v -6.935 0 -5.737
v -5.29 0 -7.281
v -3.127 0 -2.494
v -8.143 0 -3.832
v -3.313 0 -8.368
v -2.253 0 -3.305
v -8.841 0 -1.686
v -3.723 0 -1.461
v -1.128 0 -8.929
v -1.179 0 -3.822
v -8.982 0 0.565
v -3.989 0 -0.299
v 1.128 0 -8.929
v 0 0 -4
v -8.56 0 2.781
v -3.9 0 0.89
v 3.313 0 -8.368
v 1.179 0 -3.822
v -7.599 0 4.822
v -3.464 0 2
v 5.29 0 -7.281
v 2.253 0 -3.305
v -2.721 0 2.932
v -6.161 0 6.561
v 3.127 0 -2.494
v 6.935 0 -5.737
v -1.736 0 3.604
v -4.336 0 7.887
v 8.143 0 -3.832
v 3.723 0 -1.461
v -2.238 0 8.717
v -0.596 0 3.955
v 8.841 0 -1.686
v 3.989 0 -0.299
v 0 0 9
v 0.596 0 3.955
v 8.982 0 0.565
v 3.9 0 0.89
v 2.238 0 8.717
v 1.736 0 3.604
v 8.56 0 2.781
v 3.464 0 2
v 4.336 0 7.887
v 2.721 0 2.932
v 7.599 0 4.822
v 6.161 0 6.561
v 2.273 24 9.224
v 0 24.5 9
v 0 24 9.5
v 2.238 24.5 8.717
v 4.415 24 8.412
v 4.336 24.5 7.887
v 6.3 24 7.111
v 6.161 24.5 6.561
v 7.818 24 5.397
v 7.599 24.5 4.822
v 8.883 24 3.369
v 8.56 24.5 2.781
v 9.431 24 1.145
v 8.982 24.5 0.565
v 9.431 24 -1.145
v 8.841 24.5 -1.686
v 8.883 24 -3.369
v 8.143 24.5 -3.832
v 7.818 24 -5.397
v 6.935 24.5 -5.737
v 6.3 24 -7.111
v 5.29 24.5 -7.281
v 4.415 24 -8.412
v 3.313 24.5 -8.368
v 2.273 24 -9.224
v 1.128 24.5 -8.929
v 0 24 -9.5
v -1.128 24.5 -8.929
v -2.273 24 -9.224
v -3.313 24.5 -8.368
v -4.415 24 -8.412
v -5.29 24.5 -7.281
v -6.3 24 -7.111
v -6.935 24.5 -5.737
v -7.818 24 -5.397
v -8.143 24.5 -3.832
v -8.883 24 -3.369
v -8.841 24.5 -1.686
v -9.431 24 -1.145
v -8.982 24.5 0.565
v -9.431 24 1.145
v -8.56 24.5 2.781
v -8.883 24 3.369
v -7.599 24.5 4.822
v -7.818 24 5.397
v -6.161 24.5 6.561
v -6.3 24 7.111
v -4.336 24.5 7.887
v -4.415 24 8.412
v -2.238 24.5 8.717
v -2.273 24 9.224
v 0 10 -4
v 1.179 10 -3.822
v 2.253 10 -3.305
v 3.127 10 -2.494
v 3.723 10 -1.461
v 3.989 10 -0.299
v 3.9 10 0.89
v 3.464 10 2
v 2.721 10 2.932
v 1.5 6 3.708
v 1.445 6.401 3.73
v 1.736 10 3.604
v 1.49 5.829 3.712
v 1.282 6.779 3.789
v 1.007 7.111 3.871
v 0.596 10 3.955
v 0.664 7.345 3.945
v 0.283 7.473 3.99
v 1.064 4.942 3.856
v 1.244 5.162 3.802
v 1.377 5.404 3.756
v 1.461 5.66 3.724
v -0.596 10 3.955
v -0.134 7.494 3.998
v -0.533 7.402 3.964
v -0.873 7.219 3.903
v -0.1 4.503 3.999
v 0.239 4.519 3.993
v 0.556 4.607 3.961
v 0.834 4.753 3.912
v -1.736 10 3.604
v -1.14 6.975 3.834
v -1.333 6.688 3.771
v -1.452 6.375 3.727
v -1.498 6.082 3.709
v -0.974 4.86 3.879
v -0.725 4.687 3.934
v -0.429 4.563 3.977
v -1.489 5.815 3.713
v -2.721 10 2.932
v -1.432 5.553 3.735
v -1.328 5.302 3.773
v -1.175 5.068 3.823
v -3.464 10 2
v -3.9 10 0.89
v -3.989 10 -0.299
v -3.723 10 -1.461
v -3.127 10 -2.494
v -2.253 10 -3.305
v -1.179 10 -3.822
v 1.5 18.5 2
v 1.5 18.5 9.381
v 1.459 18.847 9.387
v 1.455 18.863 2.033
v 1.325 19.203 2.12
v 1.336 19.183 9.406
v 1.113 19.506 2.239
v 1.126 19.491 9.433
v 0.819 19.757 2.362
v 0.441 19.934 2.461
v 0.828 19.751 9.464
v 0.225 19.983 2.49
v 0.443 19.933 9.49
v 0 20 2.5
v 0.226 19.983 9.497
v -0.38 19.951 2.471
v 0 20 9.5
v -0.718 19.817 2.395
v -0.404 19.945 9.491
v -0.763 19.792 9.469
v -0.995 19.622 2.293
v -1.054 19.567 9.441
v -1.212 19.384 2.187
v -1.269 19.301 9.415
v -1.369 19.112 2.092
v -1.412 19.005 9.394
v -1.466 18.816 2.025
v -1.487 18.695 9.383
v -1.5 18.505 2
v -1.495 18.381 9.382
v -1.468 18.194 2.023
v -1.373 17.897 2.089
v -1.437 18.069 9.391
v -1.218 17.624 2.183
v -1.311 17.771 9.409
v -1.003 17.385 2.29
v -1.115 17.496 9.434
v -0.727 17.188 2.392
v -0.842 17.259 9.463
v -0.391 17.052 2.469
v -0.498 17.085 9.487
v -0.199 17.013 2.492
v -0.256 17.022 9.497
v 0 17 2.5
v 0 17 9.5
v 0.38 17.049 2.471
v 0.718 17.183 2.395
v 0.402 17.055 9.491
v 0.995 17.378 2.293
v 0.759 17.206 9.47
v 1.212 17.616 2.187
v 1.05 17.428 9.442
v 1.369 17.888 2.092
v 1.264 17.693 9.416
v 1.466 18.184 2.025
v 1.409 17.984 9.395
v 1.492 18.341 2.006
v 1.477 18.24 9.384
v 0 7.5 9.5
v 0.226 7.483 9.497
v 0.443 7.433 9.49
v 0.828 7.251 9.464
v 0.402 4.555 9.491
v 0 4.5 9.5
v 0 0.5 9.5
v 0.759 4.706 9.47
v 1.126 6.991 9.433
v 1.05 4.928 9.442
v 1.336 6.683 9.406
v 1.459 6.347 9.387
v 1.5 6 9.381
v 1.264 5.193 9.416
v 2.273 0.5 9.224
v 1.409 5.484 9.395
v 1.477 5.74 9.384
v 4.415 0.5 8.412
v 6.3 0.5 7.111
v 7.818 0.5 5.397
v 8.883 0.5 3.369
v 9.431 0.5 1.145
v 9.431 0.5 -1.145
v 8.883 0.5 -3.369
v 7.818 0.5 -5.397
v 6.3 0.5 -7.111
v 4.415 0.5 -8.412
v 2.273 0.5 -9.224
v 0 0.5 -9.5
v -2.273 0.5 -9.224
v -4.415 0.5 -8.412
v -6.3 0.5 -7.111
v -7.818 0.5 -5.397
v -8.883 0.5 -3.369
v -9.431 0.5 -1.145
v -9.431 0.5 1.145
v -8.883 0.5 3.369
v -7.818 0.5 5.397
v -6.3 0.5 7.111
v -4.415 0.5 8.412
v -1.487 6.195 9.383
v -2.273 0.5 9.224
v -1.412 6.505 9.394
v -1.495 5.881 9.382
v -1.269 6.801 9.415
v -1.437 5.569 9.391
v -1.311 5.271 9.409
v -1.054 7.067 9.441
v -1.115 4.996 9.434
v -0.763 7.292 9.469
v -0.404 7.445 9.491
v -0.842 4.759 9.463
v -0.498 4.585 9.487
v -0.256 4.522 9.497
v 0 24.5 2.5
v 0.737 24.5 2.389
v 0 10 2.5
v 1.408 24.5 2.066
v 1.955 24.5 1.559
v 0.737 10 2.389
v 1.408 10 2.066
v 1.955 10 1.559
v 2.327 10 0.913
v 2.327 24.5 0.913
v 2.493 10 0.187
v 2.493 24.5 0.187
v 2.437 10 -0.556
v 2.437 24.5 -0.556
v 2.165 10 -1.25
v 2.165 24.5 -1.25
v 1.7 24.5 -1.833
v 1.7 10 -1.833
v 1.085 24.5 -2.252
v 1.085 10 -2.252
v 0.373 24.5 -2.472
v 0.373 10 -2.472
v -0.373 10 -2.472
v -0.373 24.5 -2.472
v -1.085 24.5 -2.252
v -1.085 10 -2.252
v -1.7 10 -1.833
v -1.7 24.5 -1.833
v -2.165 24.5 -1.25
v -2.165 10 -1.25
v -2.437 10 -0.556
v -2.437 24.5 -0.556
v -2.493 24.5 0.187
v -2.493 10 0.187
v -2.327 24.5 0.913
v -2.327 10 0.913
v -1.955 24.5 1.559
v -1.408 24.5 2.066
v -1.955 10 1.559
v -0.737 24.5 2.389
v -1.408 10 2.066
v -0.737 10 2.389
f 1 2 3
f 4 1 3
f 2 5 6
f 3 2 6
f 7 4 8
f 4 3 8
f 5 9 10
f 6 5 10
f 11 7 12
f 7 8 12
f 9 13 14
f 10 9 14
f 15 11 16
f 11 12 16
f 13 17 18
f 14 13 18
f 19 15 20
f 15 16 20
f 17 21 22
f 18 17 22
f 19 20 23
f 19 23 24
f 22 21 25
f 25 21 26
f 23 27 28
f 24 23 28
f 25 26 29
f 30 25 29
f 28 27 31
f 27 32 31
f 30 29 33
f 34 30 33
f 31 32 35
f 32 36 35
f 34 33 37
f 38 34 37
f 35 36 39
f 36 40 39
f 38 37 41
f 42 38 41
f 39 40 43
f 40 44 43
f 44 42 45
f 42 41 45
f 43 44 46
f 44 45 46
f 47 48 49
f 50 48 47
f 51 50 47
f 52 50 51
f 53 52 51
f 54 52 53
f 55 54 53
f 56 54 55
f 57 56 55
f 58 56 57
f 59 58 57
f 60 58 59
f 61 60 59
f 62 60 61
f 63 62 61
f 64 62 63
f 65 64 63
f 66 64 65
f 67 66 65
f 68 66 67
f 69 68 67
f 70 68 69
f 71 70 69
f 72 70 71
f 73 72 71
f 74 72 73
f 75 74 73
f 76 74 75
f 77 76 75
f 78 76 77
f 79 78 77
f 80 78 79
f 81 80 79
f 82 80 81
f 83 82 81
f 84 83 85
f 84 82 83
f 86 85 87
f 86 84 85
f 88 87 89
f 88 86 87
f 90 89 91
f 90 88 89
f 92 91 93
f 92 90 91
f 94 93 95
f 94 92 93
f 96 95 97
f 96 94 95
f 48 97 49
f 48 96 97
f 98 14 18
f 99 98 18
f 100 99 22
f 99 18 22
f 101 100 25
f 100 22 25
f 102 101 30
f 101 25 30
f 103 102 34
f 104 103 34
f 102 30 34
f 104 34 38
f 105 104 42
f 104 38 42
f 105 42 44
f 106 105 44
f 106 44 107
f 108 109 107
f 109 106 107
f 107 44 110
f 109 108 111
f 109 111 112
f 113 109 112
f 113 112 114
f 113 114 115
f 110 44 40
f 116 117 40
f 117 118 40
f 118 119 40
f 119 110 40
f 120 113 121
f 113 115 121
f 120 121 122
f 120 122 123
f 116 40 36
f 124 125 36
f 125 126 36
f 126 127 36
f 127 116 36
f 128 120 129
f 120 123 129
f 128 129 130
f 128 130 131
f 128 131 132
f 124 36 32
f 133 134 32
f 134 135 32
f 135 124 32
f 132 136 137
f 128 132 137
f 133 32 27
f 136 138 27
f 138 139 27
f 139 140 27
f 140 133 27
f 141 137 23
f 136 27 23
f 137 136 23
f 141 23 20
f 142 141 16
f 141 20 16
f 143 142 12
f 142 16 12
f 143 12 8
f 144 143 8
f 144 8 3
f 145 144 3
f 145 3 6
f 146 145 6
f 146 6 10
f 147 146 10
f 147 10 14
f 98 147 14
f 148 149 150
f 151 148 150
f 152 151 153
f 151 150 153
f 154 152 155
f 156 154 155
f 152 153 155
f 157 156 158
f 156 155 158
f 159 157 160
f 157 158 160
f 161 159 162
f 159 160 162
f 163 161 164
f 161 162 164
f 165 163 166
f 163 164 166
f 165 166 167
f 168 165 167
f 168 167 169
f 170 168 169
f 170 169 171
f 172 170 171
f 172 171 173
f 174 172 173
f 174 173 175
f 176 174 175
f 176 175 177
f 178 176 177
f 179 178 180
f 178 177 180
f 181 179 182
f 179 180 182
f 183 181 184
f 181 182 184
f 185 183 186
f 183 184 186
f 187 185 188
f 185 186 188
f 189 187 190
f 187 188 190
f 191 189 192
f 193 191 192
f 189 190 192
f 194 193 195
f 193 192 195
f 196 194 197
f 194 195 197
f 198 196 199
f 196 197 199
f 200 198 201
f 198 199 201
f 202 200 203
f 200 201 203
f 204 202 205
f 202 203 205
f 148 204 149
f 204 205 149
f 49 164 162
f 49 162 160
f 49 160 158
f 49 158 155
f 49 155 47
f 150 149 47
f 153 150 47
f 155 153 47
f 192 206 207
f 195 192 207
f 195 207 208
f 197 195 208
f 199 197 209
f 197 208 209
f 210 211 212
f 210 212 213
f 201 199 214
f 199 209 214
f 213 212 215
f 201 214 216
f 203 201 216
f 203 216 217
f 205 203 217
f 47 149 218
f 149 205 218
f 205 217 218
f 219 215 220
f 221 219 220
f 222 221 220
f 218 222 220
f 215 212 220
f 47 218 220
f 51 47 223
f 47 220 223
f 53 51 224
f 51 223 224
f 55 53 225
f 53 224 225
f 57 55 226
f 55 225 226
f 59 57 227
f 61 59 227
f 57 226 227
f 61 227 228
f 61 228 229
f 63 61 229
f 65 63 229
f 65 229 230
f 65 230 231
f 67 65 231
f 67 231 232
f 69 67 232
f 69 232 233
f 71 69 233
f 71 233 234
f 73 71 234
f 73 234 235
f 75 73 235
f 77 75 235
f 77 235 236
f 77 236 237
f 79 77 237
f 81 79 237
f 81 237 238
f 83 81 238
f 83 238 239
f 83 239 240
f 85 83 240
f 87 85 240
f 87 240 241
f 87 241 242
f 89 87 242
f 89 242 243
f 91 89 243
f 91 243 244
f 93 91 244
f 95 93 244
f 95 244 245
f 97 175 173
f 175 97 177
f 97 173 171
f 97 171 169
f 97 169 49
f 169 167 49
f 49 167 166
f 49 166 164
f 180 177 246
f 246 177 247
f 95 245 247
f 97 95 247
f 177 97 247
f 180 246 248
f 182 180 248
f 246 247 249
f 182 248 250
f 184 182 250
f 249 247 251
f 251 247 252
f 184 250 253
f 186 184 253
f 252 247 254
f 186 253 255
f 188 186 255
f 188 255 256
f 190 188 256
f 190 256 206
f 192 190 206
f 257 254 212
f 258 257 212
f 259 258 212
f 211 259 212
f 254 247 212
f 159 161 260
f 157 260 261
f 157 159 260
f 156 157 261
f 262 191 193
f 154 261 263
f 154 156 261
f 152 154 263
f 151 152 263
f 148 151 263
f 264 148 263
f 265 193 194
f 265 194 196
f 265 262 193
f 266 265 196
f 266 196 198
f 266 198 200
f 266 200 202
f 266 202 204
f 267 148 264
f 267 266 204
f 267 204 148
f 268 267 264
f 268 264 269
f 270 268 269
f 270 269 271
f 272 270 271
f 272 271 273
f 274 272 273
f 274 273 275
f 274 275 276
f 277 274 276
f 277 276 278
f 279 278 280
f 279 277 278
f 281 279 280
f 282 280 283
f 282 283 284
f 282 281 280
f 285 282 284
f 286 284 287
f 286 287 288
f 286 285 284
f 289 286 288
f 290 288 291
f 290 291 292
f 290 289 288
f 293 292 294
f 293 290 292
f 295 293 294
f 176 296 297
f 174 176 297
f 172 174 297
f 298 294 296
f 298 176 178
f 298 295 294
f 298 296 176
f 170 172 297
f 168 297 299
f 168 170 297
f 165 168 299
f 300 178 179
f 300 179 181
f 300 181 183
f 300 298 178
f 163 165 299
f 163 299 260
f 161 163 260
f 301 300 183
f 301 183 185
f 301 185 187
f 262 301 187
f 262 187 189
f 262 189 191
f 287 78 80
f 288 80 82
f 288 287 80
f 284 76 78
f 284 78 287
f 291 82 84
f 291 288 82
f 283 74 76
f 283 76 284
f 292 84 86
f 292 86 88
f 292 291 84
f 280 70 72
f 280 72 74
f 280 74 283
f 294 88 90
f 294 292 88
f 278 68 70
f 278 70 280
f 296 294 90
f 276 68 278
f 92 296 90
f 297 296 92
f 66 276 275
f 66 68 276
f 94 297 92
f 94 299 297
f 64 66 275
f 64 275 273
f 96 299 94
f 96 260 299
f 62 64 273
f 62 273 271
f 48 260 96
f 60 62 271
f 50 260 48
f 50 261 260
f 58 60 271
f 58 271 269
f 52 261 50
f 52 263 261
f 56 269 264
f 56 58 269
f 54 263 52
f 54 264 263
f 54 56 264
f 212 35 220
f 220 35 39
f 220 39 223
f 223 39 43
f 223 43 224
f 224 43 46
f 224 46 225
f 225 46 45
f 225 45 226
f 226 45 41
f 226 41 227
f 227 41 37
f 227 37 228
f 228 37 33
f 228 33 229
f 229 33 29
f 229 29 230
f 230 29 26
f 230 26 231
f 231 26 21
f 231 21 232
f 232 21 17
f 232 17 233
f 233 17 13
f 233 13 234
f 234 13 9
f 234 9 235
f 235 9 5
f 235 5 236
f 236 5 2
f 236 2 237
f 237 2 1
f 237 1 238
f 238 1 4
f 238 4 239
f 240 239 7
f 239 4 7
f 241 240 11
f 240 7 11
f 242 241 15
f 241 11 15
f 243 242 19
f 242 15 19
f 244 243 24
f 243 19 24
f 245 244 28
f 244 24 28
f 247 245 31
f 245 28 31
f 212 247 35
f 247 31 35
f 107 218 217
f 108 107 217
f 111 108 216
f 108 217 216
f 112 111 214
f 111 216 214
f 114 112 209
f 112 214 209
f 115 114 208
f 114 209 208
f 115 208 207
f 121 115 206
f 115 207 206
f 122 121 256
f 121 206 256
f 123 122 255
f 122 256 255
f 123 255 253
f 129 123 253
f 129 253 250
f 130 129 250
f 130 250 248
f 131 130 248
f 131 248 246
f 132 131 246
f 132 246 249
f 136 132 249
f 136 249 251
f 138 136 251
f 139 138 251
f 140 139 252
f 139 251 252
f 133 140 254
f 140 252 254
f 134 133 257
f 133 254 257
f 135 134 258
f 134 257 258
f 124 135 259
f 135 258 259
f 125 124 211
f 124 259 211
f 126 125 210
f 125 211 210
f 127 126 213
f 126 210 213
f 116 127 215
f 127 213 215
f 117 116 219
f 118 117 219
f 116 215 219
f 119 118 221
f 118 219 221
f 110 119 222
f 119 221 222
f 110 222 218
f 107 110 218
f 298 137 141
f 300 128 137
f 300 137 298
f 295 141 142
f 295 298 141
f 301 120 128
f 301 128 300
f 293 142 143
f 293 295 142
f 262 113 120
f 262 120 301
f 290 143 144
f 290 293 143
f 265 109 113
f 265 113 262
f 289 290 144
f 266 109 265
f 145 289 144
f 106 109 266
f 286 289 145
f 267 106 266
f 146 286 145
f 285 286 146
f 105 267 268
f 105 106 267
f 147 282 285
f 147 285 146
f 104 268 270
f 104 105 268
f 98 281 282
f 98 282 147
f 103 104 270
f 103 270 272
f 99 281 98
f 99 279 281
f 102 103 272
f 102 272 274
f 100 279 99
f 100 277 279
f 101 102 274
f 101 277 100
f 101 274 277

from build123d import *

# Parameters (mm, degrees)
SKETCH_1_R          = 9.5
SKETCH_1_R_2        = 2.5
EXTRUDE_1_DEPTH     = 24.5
CHAMFER_1_SIZE      = 0.5
SKETCH_2_R          = 4
CUT_EXTRUDE_1_DEPTH = 10
SKETCH_3_R          = 1.5
CUT_EXTRUDE_2_DEPTH = 10


with BuildPart() as part:
    # 草图1 → 凸台-拉伸1 (new body)
    with BuildSketch(Plane(origin=(0, 0, 0), x_dir=(1, 0, 0), z_dir=(0, 1, 0))):
        with Locations(Location((0, 0, 0), (0, 0, 270))):
            Circle(SKETCH_1_R)
        with Locations(Location((0, 0, 0), (0, 0, 270))):
            Circle(SKETCH_1_R_2, mode=Mode.SUBTRACT)
    extrude(amount=EXTRUDE_1_DEPTH)

    # 倒角1
    chamfer_1_edges = [part.edges().sort_by_distance(p)[0] for p in [
        (0, 0, -9.5),
        (0, 24.5, -9.5),
    ]]
    chamfer(chamfer_1_edges, length=CHAMFER_1_SIZE)

    # 草图2 → 切除-拉伸1 (cut)
    with BuildSketch(Plane.XZ):
        with Locations(Location((0, 0, 0), (0, 0, 270))):
            Circle(SKETCH_2_R)
    extrude(amount=-CUT_EXTRUDE_1_DEPTH, mode=Mode.SUBTRACT)

    # 草图3 → 切除-拉伸2 (cut)
    with BuildSketch(Plane.XY.offset(9.5)):
        with Locations((0, 6)):
            Circle(SKETCH_3_R)
        with Locations((0, 18.5)):
            Circle(SKETCH_3_R)
    extrude(amount=-CUT_EXTRUDE_2_DEPTH, mode=Mode.SUBTRACT)


solid = part.part
